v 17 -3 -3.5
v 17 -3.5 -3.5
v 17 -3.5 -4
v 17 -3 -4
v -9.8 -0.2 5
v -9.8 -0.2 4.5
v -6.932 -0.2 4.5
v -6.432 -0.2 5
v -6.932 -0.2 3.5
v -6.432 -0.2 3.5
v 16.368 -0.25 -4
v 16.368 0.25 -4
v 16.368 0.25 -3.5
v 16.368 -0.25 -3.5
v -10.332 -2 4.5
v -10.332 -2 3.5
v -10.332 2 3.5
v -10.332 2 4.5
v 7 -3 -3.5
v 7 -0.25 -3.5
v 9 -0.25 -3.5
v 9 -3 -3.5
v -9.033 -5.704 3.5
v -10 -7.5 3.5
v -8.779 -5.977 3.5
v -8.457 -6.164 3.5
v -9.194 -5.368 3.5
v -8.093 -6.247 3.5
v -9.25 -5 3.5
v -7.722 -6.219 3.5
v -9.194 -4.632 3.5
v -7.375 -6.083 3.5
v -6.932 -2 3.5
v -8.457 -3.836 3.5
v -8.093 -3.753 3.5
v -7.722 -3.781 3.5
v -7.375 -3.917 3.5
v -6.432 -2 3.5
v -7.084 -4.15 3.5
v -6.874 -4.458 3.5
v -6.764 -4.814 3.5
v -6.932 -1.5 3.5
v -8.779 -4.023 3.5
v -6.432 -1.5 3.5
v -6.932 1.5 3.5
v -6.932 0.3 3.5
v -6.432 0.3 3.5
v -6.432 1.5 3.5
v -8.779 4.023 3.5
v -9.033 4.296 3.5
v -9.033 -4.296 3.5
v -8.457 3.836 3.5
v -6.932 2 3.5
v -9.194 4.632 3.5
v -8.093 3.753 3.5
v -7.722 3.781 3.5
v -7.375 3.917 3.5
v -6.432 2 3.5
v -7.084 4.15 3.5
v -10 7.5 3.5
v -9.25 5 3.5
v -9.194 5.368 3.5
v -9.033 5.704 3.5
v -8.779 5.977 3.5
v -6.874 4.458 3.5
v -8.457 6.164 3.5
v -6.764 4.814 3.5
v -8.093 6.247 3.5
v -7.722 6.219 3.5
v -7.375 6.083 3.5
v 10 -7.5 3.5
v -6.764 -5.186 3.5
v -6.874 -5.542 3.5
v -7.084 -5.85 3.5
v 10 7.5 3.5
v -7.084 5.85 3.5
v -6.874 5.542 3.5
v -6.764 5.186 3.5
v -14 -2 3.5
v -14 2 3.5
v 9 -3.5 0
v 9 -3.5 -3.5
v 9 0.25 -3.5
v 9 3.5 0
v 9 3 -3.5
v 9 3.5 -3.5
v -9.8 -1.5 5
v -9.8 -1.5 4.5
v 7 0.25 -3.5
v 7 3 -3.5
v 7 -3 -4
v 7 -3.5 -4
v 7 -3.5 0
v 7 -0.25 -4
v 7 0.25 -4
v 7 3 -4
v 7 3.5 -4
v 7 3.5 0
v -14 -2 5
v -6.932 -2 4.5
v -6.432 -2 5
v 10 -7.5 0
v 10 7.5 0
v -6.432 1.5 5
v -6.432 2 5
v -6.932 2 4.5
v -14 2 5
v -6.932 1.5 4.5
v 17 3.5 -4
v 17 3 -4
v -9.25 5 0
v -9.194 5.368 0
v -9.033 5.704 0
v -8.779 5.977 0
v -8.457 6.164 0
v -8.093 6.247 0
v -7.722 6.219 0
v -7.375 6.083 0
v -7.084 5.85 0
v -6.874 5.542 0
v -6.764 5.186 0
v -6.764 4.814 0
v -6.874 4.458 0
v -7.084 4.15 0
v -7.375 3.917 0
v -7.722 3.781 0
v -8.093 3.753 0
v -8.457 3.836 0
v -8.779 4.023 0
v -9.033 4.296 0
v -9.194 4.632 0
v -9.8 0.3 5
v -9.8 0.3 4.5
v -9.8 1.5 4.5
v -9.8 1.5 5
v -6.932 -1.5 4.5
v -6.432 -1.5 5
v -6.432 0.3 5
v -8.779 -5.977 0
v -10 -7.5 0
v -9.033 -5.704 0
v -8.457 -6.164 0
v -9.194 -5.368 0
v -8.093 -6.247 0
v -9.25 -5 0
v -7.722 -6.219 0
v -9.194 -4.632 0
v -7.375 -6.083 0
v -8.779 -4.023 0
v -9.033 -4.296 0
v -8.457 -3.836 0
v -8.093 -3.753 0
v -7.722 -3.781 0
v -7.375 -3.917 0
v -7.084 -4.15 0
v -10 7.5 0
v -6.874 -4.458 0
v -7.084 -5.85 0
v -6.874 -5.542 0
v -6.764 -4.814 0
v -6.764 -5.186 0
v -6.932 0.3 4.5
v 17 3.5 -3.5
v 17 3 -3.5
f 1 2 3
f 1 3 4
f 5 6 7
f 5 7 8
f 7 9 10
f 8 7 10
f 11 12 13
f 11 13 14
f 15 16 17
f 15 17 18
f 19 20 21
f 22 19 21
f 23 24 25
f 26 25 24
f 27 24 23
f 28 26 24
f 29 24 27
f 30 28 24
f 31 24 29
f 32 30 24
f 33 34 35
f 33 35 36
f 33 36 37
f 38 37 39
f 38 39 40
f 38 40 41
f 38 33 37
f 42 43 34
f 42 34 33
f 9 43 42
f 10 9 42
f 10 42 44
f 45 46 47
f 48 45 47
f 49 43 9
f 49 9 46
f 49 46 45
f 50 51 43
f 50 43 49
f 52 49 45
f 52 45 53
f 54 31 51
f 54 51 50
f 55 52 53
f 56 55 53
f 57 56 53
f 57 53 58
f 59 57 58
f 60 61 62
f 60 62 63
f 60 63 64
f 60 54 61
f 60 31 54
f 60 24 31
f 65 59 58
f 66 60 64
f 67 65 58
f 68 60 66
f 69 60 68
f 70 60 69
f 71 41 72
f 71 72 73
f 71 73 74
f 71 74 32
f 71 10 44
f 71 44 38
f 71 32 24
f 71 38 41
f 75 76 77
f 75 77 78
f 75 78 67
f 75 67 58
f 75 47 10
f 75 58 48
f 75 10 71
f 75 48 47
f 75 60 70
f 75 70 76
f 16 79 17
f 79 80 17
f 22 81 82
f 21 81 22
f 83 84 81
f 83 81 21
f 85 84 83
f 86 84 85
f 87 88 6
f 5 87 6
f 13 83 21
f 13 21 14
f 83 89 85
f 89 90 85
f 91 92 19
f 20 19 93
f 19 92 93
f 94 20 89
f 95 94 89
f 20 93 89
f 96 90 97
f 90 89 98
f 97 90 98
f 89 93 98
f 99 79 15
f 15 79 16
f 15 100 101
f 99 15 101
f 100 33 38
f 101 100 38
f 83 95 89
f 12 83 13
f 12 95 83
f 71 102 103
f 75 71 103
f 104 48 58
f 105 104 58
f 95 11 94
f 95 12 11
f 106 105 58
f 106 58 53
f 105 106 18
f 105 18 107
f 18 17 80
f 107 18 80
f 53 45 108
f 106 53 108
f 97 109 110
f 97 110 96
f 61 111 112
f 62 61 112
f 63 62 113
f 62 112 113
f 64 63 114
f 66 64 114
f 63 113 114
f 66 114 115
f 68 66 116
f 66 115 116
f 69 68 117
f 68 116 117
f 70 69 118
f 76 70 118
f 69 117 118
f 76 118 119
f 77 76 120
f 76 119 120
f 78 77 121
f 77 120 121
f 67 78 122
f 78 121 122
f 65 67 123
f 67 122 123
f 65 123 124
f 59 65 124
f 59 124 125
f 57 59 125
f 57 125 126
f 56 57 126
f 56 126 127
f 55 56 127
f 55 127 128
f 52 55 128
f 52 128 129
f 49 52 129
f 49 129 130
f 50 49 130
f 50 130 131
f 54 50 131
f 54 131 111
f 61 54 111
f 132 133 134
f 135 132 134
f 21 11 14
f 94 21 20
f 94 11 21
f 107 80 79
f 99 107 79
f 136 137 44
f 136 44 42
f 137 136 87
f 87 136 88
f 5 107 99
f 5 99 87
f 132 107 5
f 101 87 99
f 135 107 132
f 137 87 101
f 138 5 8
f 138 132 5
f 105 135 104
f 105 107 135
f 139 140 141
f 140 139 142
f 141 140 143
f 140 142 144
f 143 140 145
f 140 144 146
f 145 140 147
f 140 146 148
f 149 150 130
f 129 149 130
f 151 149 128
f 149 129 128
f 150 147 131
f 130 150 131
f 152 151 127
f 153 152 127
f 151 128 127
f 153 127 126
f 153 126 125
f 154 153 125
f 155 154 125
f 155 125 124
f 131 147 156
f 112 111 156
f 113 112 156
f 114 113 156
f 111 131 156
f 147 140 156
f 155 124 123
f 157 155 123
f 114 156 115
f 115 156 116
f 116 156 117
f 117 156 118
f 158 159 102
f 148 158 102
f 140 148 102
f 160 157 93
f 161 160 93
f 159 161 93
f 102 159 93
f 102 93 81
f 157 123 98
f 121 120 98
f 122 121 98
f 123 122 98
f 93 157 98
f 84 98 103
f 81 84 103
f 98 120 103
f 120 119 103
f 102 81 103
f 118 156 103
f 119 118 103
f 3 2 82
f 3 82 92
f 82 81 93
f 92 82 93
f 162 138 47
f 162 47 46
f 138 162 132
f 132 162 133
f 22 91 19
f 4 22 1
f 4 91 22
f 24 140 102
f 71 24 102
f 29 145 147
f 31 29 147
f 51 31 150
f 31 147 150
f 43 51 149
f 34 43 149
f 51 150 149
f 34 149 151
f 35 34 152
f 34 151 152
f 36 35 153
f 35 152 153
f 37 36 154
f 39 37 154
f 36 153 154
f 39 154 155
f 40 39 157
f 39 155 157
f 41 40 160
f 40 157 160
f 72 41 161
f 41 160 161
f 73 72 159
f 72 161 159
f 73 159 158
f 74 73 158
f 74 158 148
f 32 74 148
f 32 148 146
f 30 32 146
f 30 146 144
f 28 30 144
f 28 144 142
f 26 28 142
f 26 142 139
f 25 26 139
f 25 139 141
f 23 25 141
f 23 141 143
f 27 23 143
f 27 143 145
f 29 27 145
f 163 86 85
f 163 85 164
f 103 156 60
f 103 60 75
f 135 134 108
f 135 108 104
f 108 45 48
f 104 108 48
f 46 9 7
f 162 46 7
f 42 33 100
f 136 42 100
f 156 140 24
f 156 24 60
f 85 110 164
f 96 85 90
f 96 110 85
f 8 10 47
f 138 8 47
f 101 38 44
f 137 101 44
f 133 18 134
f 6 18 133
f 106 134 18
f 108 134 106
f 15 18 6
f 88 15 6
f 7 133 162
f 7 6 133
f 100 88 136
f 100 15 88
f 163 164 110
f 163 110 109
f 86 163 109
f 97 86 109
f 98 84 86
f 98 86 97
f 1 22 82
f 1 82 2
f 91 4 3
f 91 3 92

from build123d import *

# Parameters (mm, degrees)
SKETCH1_W           = 20
SKETCH1_H           = 15
BOSS_EXTRUDE1_DEPTH = 3.5
BOSS_EXTRUDE8_DEPTH = 1.5
SKETCH3_W           = 3.4
SKETCH3_H           = 1
CUT_EXTRUDE1_DEPTH  = 18.642278764
SKETCH7_R           = 1.25
CUT_EXTRUDE4_DEPTH  = 17.650825805
SKETCH8_W           = 10
SKETCH8_H           = 7
BOSS_EXTRUDE9_DEPTH = 4
CUT_EXTRUDE5_DEPTH  = 0.5
SKETCH10_W          = 8
SKETCH10_H          = 3.5
CUT_EXTRUDE6_DEPTH  = 21.856653615


with BuildPart() as part:
    # Sketch1 → Boss-Extrude1 (new body)
    with BuildSketch(Plane.XY):
        Rectangle(SKETCH1_W, SKETCH1_H)
    extrude(amount=BOSS_EXTRUDE1_DEPTH)

    # Sketch2 → Boss-Extrude8 (add)
    with BuildSketch(Plane.XY.offset(3.5)):
        Polygon((-6.431580724, 2), (-10, 2), (-10, 1.5), (-10, 0.3), (-10, -2), (-6.431580724, -2), (-6.431580724, -1.5), (-9.8, -1.5), (-9.8, -0.2), (-6.431580724, -0.2), (-6.431580724, 0.3), (-9.8, 0.3), (-9.8, 1.5), (-6.431580724, 1.5), align=None)
        Polygon((-10, 1.5), (-10, 2), (-14, 2), (-14, -2), (-10, -2), (-10, 0.3), align=None)
    extrude(amount=BOSS_EXTRUDE8_DEPTH)

    # Sketch3 → Cut-Extrude1 (cut, through all)
    with BuildSketch(Plane.XZ.offset(2)):
        with Locations((-8.631580724, 4)):
            Rectangle(SKETCH3_W, SKETCH3_H)
    extrude(amount=-CUT_EXTRUDE1_DEPTH, mode=Mode.SUBTRACT)

    # Sketch7 → Cut-Extrude4 (cut, through all)
    with BuildSketch(Plane(origin=(0, 0, 0), x_dir=(-1, 0, 0), z_dir=(0, 0, -1))):
        with Locations((8, -5)):
            Circle(SKETCH7_R)
        with Locations((8, 5)):
            Circle(SKETCH7_R)
    extrude(amount=-CUT_EXTRUDE4_DEPTH, mode=Mode.SUBTRACT)

    # Sketch8 → Boss-Extrude9 (add)
    with BuildSketch(Plane(origin=(0, 0, 0), x_dir=(-1, 0, 0), z_dir=(0, 0, -1))):
        with Locations((-12, 0)):
            Rectangle(SKETCH8_W, SKETCH8_H)
    extrude(amount=BOSS_EXTRUDE9_DEPTH)

    # Sketch9 → Cut-Extrude5 (cut)
    with BuildSketch(Plane(origin=(0, 0, -4), x_dir=(-1, 0, 0), z_dir=(0, 0, -1))):
        Polygon((-6, -3), (-18, -3), (-18, 3), (-6, 3), (-6, 0.25), (-16.368004225, 0.25), (-16.368004225, -0.25), (-6, -0.25), align=None)
    extrude(amount=-CUT_EXTRUDE5_DEPTH, mode=Mode.SUBTRACT)

    # Sketch10 → Cut-Extrude6 (cut, through all)
    with BuildSketch(Plane(origin=(0, 3.5, 0), x_dir=(1, 0, 0), z_dir=(0, 1, 0))):
        with Locations((13, 1.75)):
            Rectangle(SKETCH10_W, SKETCH10_H)
    extrude(amount=-CUT_EXTRUDE6_DEPTH, mode=Mode.SUBTRACT)


solid = part.part
